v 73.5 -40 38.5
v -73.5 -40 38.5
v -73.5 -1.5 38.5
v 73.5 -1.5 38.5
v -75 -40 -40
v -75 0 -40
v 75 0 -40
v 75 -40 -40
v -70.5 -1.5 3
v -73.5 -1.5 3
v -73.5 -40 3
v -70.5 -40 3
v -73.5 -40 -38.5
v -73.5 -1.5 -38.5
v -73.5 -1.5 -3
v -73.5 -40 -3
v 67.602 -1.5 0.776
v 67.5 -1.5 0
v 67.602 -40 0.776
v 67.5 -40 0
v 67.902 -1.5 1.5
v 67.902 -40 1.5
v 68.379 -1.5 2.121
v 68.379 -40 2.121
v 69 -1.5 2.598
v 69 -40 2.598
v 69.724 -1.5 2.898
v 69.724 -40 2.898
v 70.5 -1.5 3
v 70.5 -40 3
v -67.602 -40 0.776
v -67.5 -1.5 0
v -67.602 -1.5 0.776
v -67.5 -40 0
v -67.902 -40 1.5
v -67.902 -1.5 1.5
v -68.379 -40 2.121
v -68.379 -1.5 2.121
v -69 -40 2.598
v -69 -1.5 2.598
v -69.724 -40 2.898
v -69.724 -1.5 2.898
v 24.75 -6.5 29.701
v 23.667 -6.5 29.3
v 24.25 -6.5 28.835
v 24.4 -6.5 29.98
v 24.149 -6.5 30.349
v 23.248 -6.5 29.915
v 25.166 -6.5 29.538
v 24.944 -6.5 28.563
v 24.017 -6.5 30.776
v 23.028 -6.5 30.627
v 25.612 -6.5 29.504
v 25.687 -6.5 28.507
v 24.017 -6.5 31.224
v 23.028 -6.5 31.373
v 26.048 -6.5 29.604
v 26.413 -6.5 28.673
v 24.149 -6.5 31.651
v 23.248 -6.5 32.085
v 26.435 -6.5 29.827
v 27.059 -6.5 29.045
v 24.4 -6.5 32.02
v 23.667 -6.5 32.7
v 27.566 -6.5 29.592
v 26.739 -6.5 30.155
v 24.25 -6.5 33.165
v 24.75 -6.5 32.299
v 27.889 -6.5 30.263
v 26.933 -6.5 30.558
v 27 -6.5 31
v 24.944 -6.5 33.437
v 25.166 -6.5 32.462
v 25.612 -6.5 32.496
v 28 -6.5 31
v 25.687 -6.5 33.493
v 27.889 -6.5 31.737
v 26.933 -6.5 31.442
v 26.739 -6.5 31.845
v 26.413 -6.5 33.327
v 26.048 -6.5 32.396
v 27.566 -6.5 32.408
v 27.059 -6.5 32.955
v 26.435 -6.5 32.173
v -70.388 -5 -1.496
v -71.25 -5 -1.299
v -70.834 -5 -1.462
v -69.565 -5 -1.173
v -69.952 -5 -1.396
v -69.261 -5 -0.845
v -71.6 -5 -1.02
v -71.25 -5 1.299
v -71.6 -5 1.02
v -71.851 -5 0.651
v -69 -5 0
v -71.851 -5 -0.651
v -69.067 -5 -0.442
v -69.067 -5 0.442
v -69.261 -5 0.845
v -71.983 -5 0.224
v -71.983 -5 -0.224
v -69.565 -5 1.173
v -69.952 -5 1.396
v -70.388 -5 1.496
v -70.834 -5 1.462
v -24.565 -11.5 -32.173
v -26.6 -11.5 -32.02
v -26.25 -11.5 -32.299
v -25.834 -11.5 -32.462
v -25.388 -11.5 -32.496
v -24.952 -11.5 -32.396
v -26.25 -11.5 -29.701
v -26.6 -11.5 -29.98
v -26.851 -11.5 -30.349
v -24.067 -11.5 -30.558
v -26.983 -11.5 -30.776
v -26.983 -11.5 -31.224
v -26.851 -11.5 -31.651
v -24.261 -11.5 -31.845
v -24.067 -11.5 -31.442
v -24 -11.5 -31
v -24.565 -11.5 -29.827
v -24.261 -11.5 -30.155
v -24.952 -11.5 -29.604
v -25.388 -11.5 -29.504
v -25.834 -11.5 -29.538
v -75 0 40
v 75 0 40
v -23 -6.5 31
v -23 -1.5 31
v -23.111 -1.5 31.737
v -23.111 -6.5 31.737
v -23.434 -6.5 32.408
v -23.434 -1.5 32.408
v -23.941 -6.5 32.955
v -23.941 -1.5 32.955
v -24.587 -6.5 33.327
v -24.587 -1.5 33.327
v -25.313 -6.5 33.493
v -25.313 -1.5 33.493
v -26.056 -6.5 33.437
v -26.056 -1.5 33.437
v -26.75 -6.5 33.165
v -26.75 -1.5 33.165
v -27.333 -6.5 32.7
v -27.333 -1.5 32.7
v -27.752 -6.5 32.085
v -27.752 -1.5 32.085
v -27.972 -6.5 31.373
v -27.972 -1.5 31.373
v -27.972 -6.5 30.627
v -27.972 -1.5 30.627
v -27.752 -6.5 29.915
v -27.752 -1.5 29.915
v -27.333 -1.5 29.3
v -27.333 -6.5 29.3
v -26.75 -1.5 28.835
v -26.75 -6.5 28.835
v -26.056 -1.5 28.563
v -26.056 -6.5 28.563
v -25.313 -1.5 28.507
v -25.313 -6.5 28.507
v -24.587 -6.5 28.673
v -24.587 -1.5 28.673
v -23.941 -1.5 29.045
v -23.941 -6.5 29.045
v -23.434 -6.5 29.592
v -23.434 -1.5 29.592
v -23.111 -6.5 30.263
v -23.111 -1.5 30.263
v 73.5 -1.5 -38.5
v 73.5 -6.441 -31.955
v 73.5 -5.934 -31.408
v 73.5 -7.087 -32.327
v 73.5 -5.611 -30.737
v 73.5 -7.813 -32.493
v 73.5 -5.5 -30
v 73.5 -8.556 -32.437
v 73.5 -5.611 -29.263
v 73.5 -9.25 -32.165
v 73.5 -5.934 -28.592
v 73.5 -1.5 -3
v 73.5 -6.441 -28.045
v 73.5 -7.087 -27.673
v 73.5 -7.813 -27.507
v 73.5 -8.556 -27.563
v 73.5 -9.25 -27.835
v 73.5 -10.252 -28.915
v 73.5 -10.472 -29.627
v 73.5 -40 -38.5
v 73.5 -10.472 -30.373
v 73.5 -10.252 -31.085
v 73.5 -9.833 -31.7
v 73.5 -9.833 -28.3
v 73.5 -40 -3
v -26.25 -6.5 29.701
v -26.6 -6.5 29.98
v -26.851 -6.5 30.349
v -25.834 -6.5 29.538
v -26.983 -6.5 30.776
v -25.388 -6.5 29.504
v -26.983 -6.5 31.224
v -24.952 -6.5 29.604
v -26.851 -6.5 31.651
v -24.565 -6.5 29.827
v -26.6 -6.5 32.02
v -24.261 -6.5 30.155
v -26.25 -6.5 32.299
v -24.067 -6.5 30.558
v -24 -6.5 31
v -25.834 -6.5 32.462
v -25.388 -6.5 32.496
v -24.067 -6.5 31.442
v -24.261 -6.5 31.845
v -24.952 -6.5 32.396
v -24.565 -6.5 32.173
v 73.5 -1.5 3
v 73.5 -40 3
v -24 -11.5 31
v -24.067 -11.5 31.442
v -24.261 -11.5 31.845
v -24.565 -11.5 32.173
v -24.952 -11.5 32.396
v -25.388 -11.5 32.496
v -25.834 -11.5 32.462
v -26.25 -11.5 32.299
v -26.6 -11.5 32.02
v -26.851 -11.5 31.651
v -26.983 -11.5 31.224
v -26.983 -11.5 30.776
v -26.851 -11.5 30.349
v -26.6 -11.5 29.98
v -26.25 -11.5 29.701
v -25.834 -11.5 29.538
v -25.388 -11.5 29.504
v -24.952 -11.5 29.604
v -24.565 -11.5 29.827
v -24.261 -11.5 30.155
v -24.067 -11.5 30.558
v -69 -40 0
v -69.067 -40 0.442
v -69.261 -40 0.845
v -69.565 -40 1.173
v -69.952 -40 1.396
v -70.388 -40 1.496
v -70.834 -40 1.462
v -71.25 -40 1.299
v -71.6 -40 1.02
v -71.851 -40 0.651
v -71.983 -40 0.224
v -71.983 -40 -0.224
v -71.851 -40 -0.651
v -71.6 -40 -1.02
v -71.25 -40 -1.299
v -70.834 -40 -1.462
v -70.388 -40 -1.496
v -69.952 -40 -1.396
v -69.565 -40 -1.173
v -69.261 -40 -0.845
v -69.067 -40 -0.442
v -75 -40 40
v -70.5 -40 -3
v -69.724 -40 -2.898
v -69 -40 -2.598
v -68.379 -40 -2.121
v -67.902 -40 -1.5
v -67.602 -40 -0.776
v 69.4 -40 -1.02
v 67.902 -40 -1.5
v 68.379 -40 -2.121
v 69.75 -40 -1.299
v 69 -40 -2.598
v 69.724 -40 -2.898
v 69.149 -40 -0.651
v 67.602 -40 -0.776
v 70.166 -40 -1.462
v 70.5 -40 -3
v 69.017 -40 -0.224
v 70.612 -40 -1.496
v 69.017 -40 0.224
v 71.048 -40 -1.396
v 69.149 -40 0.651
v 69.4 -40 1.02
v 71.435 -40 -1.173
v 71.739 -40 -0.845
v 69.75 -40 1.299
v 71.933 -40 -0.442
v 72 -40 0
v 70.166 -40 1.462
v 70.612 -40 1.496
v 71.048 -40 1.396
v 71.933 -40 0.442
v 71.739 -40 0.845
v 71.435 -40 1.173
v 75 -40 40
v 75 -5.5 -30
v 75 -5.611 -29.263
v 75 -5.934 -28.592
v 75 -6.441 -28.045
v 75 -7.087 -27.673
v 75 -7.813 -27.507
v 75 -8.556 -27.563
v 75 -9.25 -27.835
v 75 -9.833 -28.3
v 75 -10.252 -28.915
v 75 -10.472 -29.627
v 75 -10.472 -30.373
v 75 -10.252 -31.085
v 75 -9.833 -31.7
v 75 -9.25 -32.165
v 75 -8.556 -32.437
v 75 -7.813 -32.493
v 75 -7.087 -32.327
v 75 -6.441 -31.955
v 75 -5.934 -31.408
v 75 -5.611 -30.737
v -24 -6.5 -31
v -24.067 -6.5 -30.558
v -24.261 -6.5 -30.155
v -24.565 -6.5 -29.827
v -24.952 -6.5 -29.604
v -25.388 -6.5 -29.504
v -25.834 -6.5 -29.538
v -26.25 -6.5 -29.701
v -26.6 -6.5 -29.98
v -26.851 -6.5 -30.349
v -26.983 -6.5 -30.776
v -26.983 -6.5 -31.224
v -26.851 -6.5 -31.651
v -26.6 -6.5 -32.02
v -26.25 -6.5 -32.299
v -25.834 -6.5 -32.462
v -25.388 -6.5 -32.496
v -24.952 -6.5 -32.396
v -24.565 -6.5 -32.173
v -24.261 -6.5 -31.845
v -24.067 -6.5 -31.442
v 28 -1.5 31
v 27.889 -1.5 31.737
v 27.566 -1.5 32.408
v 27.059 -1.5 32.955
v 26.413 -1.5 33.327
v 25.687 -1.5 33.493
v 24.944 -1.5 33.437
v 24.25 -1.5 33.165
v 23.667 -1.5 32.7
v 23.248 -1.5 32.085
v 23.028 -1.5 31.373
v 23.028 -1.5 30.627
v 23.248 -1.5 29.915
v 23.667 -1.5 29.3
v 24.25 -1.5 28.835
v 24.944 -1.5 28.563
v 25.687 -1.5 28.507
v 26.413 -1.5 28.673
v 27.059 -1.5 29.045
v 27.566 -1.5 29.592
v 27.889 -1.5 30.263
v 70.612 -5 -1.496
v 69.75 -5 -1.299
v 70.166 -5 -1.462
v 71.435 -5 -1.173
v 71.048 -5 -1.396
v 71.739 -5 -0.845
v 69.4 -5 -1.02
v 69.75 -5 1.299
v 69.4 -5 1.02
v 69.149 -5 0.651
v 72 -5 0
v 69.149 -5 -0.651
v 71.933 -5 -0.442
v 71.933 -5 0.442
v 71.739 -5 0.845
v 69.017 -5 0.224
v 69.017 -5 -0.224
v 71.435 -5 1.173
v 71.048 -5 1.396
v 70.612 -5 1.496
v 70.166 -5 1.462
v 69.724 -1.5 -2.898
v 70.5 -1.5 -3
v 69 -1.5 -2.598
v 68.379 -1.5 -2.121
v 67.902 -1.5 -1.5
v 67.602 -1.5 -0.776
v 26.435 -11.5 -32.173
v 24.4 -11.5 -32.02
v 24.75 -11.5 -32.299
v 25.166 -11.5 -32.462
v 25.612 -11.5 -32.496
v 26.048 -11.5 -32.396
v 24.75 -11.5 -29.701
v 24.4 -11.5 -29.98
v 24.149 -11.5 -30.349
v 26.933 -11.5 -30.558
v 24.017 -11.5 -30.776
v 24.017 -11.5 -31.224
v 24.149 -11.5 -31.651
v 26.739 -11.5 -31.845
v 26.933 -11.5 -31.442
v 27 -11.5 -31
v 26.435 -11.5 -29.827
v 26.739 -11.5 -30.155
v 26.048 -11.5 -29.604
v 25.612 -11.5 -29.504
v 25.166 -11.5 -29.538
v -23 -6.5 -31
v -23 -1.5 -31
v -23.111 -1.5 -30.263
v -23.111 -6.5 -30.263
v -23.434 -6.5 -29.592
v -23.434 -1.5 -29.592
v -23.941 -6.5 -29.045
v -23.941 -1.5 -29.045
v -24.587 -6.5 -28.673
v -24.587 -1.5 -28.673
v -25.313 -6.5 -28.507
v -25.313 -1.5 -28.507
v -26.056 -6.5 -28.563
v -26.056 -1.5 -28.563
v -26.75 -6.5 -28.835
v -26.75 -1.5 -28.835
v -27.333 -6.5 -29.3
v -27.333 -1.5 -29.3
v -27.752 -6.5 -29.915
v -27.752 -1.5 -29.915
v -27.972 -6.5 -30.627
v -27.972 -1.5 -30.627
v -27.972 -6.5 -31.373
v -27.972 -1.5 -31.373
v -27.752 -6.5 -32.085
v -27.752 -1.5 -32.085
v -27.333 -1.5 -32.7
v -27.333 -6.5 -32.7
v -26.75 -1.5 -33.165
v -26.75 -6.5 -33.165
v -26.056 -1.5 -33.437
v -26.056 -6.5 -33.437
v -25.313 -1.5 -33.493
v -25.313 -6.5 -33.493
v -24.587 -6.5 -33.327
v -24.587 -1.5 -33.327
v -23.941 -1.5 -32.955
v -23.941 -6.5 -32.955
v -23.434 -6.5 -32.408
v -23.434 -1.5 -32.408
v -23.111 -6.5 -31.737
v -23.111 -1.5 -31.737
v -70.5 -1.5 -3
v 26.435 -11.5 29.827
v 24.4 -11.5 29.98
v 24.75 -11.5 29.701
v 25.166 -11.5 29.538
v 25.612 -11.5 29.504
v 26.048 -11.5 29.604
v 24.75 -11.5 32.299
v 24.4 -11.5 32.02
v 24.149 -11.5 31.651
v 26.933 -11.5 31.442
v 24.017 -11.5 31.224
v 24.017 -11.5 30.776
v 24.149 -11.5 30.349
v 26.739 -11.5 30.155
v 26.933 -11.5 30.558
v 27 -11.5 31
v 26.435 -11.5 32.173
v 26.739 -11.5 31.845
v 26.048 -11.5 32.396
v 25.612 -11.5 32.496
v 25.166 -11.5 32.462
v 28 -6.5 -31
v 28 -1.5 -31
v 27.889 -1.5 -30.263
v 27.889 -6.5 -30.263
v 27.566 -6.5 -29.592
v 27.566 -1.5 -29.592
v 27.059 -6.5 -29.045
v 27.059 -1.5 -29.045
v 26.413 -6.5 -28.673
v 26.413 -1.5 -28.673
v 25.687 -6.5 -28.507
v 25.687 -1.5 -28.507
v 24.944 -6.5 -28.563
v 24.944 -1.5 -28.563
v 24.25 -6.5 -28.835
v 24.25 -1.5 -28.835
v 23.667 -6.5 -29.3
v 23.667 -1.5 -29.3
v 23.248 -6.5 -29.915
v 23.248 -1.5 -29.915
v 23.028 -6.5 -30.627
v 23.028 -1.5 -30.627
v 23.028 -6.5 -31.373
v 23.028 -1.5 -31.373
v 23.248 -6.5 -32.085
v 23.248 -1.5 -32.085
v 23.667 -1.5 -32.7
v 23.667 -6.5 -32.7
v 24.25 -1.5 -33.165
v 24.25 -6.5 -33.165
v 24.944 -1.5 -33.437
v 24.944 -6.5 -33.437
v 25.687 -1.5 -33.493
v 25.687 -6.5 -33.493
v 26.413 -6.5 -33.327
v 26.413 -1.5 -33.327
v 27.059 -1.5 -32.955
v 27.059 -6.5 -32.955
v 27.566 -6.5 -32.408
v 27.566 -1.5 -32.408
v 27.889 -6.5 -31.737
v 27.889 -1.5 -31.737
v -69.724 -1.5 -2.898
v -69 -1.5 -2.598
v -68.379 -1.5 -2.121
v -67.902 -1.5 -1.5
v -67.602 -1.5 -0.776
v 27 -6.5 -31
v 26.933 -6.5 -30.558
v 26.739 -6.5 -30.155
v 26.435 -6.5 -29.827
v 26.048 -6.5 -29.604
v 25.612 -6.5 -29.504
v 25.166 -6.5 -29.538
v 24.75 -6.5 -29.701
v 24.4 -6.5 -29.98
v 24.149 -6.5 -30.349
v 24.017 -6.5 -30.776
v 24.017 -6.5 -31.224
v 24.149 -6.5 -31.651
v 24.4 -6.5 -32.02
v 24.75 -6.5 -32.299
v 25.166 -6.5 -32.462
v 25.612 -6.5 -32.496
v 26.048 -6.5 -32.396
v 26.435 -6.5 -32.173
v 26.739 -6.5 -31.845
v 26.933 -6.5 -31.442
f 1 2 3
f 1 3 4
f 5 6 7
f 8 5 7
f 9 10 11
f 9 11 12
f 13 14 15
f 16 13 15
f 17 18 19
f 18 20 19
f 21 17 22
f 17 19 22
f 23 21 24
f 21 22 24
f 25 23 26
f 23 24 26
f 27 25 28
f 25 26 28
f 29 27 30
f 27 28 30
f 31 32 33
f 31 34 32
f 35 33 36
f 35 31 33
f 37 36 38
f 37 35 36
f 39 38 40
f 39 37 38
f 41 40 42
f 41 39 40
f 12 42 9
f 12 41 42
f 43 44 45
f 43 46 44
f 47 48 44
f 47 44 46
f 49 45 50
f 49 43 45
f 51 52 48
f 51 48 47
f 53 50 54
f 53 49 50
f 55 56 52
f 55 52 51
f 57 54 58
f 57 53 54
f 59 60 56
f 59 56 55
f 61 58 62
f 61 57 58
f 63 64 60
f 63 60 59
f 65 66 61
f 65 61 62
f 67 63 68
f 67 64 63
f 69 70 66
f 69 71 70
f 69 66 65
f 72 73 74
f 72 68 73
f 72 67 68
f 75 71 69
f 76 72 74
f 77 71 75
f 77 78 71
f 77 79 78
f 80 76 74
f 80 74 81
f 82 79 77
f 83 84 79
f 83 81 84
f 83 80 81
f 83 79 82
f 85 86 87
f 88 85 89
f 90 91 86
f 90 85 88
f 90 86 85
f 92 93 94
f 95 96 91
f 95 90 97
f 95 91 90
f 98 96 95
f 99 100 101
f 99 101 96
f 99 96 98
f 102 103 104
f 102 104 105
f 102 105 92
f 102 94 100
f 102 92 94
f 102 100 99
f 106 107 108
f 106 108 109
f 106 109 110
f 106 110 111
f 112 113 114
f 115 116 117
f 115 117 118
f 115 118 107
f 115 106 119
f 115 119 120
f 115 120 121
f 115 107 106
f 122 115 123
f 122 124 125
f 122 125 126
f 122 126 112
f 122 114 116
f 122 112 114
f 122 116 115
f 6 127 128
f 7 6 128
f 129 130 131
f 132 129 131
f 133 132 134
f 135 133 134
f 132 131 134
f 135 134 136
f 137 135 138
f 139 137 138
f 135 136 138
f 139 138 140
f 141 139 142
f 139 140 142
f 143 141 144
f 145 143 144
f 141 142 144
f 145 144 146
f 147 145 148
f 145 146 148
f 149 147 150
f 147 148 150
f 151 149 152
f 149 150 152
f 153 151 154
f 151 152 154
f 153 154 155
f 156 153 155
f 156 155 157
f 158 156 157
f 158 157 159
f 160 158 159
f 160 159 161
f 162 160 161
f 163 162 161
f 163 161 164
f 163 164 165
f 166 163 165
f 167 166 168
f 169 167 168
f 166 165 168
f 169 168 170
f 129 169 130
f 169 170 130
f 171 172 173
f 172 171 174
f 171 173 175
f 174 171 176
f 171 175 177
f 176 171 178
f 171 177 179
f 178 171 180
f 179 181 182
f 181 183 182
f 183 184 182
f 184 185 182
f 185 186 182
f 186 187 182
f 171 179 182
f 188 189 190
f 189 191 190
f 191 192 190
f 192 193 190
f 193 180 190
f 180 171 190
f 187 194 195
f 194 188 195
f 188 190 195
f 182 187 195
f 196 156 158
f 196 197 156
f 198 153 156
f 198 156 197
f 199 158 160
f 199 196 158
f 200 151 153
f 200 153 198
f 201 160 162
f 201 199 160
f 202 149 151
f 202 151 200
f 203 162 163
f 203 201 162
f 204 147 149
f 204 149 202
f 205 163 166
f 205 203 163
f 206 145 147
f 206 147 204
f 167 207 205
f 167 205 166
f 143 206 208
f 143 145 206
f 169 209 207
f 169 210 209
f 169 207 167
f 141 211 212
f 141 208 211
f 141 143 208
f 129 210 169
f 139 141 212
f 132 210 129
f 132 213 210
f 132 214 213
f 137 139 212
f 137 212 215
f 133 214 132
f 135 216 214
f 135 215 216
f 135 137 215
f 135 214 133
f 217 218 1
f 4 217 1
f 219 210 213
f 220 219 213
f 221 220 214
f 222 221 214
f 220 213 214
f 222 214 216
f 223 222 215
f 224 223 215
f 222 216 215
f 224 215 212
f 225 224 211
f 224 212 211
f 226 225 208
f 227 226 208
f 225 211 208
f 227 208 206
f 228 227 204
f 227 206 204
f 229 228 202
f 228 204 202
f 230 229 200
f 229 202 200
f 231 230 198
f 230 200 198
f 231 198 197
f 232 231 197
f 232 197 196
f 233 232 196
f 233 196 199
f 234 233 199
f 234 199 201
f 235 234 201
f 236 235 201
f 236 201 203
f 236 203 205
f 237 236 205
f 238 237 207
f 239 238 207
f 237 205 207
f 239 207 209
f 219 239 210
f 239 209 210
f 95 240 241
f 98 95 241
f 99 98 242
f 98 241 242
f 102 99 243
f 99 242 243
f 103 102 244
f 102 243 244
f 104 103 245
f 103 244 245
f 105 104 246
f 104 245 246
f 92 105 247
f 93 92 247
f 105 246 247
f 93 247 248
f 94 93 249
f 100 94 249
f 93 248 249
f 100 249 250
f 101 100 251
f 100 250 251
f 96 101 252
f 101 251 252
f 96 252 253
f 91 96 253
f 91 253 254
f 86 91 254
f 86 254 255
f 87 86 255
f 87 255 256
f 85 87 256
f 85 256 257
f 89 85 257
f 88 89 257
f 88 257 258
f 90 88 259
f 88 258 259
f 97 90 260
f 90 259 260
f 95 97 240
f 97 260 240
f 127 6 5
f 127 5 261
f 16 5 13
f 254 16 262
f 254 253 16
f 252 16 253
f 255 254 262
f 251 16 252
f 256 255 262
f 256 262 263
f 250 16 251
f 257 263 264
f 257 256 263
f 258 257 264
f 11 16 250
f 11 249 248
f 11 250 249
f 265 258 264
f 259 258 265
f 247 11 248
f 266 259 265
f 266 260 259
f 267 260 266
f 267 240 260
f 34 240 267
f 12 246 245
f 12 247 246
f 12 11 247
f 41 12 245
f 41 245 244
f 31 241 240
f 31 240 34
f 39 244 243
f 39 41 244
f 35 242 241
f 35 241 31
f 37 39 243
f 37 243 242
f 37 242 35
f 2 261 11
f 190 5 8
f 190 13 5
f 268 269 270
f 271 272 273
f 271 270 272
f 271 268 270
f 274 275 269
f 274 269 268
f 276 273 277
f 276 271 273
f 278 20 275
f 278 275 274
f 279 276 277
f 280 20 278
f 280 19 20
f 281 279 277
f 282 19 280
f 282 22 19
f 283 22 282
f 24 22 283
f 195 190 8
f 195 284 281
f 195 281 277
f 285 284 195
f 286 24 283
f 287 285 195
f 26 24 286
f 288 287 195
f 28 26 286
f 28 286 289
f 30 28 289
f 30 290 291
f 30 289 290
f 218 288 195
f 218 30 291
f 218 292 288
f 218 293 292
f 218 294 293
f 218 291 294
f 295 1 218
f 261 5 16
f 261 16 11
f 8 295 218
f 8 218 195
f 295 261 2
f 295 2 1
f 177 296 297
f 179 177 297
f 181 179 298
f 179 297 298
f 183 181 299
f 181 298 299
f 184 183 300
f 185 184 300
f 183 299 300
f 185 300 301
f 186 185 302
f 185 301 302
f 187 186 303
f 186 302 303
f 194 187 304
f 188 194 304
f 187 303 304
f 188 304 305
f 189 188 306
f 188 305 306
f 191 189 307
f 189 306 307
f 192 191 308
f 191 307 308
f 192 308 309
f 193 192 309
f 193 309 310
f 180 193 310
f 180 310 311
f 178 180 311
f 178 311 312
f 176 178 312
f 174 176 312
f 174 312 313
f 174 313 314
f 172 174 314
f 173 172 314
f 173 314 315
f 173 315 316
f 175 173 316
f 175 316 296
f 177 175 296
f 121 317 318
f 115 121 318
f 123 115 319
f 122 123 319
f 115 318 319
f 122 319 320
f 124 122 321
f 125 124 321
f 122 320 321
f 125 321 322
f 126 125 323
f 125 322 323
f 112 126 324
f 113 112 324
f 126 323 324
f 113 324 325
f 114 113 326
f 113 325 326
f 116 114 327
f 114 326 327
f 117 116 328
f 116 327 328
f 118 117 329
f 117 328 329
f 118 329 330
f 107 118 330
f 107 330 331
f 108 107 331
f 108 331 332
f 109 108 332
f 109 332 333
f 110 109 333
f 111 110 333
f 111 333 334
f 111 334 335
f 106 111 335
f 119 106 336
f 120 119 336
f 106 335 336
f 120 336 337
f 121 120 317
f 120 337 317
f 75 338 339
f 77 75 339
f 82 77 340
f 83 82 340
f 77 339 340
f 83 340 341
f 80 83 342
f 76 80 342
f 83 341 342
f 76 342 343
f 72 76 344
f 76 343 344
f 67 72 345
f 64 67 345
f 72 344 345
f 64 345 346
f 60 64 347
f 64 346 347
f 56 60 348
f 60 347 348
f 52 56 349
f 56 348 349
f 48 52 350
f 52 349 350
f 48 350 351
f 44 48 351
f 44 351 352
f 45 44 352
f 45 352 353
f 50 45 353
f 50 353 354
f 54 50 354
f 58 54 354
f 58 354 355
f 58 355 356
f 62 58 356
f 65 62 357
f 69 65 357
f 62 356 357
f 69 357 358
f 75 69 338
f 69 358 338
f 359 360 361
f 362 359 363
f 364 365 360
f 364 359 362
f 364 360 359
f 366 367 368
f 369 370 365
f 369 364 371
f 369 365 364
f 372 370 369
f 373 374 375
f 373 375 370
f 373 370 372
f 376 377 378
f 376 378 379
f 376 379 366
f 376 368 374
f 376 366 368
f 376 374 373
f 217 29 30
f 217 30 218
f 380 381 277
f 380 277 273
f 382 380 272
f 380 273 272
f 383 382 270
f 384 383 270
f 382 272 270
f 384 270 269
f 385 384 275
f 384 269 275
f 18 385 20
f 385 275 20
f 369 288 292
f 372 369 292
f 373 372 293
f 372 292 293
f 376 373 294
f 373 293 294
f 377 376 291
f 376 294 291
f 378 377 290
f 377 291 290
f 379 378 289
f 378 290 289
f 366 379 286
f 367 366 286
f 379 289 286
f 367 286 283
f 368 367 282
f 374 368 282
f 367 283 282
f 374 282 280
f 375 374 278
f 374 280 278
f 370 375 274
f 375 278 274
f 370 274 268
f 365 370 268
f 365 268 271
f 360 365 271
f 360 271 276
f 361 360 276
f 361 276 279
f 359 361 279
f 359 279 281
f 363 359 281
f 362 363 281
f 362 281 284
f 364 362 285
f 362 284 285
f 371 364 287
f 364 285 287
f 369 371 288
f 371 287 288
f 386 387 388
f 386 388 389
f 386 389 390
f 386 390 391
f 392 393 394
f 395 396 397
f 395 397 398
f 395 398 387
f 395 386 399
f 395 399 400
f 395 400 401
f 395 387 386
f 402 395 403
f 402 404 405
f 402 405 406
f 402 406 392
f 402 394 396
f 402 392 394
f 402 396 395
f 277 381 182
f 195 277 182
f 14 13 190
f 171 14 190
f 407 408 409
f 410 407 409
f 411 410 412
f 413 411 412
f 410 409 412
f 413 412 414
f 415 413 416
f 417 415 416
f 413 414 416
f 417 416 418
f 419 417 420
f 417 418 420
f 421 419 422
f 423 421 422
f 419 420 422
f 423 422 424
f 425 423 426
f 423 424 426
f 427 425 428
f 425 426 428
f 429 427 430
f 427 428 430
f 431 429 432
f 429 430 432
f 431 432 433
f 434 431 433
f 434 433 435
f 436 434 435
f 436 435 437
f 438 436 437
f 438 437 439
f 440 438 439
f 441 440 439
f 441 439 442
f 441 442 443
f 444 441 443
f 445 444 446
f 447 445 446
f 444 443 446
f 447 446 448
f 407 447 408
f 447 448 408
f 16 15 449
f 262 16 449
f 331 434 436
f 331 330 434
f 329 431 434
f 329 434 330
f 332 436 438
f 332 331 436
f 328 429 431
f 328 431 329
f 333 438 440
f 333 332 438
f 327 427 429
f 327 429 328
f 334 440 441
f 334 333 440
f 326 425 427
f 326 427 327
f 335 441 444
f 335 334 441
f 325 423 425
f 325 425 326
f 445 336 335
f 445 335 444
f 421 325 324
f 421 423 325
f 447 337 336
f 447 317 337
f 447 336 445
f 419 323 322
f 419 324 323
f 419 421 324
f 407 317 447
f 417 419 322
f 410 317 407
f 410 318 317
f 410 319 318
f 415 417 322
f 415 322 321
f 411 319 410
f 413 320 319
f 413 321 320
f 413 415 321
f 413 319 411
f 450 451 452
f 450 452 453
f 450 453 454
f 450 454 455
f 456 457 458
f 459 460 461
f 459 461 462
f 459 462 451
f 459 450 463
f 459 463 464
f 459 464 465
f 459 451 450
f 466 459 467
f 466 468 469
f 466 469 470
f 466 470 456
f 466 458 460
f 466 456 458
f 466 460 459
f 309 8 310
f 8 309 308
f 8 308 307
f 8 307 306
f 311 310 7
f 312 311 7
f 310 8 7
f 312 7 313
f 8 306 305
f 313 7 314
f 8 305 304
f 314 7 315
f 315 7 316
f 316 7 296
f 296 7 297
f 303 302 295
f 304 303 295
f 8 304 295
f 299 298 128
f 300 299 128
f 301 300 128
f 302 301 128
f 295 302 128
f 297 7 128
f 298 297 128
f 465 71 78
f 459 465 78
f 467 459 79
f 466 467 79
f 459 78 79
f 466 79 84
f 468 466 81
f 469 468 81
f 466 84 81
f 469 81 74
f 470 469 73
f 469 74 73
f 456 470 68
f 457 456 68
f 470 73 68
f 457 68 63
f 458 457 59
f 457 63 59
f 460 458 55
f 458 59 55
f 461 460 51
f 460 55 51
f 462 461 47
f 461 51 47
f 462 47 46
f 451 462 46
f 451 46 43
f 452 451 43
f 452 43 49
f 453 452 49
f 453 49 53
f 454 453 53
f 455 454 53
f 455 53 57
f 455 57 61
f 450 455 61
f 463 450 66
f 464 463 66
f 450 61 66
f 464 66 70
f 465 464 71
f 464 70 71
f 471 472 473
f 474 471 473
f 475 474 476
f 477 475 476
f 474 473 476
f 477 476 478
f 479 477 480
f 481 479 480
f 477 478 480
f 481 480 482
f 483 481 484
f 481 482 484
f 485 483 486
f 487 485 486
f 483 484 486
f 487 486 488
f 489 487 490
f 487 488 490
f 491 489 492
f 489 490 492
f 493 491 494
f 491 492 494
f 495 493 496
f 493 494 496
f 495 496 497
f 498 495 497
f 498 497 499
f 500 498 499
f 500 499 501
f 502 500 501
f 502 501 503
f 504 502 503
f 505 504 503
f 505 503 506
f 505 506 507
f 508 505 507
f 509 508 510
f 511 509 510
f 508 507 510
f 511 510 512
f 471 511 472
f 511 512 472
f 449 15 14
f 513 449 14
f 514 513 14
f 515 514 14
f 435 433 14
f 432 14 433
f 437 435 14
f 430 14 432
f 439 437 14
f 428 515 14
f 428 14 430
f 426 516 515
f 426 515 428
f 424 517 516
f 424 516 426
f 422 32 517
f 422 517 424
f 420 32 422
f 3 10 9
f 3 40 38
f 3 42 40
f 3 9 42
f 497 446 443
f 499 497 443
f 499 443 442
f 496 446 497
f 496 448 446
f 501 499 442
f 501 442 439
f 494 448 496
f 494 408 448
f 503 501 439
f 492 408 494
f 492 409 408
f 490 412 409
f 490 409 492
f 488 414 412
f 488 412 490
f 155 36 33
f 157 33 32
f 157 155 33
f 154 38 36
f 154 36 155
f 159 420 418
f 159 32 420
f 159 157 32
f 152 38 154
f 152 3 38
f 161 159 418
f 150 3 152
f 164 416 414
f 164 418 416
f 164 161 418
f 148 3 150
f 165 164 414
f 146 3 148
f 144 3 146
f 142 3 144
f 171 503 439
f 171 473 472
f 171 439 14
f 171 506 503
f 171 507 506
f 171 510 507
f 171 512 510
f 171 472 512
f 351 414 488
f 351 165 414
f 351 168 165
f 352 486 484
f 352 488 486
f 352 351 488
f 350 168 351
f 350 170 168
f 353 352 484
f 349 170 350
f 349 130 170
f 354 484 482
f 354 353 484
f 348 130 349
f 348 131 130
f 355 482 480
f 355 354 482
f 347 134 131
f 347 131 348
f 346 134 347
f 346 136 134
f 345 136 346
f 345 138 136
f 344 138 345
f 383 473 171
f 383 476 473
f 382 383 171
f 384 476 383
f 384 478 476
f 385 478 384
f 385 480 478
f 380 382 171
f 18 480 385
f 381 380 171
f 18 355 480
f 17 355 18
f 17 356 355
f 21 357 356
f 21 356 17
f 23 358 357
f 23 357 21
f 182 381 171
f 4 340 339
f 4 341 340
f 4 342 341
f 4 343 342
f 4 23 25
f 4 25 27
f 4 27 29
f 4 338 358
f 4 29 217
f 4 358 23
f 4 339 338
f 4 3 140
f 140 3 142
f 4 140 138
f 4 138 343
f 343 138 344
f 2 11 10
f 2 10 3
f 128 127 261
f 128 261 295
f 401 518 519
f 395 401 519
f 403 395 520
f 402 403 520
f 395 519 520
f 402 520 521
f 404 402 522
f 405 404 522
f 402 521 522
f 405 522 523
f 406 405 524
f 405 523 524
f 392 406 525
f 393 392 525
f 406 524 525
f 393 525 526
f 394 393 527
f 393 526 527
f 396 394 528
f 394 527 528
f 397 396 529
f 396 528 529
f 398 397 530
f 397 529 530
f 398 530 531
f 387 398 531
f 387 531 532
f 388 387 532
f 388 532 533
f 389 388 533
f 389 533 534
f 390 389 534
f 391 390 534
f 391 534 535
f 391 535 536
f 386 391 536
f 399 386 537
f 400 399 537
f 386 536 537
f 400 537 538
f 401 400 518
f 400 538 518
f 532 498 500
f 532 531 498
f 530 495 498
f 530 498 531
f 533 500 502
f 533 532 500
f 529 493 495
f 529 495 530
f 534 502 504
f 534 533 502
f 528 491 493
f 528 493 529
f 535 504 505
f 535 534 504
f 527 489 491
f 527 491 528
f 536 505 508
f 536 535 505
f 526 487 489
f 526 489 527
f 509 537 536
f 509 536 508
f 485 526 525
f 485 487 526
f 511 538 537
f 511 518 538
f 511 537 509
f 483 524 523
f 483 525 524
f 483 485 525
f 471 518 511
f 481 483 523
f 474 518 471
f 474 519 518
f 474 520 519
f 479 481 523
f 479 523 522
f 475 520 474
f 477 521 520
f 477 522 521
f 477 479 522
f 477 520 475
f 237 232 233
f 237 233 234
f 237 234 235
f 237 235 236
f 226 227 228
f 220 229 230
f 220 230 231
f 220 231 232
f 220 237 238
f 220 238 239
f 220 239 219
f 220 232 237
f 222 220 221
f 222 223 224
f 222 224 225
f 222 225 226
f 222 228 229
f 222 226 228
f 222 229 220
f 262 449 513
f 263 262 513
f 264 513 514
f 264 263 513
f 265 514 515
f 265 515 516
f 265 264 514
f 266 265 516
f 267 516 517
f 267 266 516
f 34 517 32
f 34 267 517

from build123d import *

# Parameters (mm, degrees)
F0_W      = 150
F0_H      = 80
F1_DEPTH  = 40
F2_W      = 147
F2_H      = 77
F3_DEPTH  = 38.5
F4_R      = 2.5
F5_DEPTH  = 5
F6_R      = 1.5
F7_R      = 1.5
F8_R      = 1.5
F9_R      = 1.5
F10_DEPTH = 5
F11_R     = 2.5
F12_DEPTH = 3
F13_W     = 6
F13_H     = 6
F14_DEPTH = 38.5
F15_R     = 1.5
F16_DEPTH = 35
F17_R     = 2.99999


# Not quite as in the source:
# - a fillet or chamfer is up to 0.001 mm smaller than in the source, because OpenCascade refuses the exact size


with BuildPart() as f1:
    # F0 (on Front) → F1 (new body)
    with BuildSketch(Plane.XZ):
        Rectangle(F0_W, F0_H)
    extrude(amount=F1_DEPTH)

    # F2 (on face) → F3 (cut)
    with BuildSketch(Plane.XZ.offset(40)):
        Rectangle(F2_W, F2_H)
    extrude(amount=-F3_DEPTH, mode=Mode.SUBTRACT)

    # F4 (on face) → F5 (join)
    with BuildSketch(Plane.XZ.offset(1.5)):
        with Locations((-25.5, 31)):
            Circle(F4_R)
        with Locations((-25.5, -31)):
            Circle(F4_R)
        with Locations((25.5, 31)):
            Circle(F4_R)
        with Locations((25.5, -31)):
            Circle(F4_R)
    extrude(amount=F5_DEPTH)

    # F6 (on face) + F7 (on face) + F8 (on face) + F9 (on face) → F10 (join)
    with BuildSketch(Plane.XZ.offset(6.5)):
        with Locations((-25.5, 31)):
            Circle(F6_R)
    with BuildSketch(Plane.XZ.offset(6.5)):
        with Locations((25.5, 31)):
            Circle(F7_R)
    with BuildSketch(Plane.XZ.offset(6.5)):
        with Locations((-25.5, -31)):
            Circle(F8_R)
    with BuildSketch(Plane.XZ.offset(6.5)):
        with Locations((25.5, -31)):
            Circle(F9_R)
    extrude(amount=F10_DEPTH)

    # F11 (on face) → F12 (cut)
    with BuildSketch(Plane.YZ.offset(75)):
        with Locations((-8, -30)):
            Circle(F11_R)
    extrude(amount=-F12_DEPTH, mode=Mode.SUBTRACT)

    # F13 (on face) → F14 (join)
    with BuildSketch(Plane.XZ.offset(1.5)):
        with Locations((-70.5, 0)):
            Rectangle(F13_W, F13_H)
        with Locations((70.5, 0)):
            Rectangle(F13_W, F13_H)
    extrude(amount=F14_DEPTH)

    # F15 (on face) → F16 (cut)
    with BuildSketch(Plane.XZ.offset(40)):
        with Locations((-70.5, 0)):
            Circle(F15_R)
        with Locations((70.5, 0)):
            Circle(F15_R)
    extrude(amount=-F16_DEPTH, mode=Mode.SUBTRACT)

    # F17 (radius 3 in the source; OpenCascade refuses exactly that, so slightly less here)
    f17_edges = [f1.edges().sort_by_distance(p)[0] for p in [
        (-67.5, -20.75, 3),
        (-67.5, -20.75, -3),
        (67.5, -20.75, -3),
        (67.5, -20.75, 3),
    ]]
    fillet(f17_edges, radius=F17_R)


solid = f1.part
